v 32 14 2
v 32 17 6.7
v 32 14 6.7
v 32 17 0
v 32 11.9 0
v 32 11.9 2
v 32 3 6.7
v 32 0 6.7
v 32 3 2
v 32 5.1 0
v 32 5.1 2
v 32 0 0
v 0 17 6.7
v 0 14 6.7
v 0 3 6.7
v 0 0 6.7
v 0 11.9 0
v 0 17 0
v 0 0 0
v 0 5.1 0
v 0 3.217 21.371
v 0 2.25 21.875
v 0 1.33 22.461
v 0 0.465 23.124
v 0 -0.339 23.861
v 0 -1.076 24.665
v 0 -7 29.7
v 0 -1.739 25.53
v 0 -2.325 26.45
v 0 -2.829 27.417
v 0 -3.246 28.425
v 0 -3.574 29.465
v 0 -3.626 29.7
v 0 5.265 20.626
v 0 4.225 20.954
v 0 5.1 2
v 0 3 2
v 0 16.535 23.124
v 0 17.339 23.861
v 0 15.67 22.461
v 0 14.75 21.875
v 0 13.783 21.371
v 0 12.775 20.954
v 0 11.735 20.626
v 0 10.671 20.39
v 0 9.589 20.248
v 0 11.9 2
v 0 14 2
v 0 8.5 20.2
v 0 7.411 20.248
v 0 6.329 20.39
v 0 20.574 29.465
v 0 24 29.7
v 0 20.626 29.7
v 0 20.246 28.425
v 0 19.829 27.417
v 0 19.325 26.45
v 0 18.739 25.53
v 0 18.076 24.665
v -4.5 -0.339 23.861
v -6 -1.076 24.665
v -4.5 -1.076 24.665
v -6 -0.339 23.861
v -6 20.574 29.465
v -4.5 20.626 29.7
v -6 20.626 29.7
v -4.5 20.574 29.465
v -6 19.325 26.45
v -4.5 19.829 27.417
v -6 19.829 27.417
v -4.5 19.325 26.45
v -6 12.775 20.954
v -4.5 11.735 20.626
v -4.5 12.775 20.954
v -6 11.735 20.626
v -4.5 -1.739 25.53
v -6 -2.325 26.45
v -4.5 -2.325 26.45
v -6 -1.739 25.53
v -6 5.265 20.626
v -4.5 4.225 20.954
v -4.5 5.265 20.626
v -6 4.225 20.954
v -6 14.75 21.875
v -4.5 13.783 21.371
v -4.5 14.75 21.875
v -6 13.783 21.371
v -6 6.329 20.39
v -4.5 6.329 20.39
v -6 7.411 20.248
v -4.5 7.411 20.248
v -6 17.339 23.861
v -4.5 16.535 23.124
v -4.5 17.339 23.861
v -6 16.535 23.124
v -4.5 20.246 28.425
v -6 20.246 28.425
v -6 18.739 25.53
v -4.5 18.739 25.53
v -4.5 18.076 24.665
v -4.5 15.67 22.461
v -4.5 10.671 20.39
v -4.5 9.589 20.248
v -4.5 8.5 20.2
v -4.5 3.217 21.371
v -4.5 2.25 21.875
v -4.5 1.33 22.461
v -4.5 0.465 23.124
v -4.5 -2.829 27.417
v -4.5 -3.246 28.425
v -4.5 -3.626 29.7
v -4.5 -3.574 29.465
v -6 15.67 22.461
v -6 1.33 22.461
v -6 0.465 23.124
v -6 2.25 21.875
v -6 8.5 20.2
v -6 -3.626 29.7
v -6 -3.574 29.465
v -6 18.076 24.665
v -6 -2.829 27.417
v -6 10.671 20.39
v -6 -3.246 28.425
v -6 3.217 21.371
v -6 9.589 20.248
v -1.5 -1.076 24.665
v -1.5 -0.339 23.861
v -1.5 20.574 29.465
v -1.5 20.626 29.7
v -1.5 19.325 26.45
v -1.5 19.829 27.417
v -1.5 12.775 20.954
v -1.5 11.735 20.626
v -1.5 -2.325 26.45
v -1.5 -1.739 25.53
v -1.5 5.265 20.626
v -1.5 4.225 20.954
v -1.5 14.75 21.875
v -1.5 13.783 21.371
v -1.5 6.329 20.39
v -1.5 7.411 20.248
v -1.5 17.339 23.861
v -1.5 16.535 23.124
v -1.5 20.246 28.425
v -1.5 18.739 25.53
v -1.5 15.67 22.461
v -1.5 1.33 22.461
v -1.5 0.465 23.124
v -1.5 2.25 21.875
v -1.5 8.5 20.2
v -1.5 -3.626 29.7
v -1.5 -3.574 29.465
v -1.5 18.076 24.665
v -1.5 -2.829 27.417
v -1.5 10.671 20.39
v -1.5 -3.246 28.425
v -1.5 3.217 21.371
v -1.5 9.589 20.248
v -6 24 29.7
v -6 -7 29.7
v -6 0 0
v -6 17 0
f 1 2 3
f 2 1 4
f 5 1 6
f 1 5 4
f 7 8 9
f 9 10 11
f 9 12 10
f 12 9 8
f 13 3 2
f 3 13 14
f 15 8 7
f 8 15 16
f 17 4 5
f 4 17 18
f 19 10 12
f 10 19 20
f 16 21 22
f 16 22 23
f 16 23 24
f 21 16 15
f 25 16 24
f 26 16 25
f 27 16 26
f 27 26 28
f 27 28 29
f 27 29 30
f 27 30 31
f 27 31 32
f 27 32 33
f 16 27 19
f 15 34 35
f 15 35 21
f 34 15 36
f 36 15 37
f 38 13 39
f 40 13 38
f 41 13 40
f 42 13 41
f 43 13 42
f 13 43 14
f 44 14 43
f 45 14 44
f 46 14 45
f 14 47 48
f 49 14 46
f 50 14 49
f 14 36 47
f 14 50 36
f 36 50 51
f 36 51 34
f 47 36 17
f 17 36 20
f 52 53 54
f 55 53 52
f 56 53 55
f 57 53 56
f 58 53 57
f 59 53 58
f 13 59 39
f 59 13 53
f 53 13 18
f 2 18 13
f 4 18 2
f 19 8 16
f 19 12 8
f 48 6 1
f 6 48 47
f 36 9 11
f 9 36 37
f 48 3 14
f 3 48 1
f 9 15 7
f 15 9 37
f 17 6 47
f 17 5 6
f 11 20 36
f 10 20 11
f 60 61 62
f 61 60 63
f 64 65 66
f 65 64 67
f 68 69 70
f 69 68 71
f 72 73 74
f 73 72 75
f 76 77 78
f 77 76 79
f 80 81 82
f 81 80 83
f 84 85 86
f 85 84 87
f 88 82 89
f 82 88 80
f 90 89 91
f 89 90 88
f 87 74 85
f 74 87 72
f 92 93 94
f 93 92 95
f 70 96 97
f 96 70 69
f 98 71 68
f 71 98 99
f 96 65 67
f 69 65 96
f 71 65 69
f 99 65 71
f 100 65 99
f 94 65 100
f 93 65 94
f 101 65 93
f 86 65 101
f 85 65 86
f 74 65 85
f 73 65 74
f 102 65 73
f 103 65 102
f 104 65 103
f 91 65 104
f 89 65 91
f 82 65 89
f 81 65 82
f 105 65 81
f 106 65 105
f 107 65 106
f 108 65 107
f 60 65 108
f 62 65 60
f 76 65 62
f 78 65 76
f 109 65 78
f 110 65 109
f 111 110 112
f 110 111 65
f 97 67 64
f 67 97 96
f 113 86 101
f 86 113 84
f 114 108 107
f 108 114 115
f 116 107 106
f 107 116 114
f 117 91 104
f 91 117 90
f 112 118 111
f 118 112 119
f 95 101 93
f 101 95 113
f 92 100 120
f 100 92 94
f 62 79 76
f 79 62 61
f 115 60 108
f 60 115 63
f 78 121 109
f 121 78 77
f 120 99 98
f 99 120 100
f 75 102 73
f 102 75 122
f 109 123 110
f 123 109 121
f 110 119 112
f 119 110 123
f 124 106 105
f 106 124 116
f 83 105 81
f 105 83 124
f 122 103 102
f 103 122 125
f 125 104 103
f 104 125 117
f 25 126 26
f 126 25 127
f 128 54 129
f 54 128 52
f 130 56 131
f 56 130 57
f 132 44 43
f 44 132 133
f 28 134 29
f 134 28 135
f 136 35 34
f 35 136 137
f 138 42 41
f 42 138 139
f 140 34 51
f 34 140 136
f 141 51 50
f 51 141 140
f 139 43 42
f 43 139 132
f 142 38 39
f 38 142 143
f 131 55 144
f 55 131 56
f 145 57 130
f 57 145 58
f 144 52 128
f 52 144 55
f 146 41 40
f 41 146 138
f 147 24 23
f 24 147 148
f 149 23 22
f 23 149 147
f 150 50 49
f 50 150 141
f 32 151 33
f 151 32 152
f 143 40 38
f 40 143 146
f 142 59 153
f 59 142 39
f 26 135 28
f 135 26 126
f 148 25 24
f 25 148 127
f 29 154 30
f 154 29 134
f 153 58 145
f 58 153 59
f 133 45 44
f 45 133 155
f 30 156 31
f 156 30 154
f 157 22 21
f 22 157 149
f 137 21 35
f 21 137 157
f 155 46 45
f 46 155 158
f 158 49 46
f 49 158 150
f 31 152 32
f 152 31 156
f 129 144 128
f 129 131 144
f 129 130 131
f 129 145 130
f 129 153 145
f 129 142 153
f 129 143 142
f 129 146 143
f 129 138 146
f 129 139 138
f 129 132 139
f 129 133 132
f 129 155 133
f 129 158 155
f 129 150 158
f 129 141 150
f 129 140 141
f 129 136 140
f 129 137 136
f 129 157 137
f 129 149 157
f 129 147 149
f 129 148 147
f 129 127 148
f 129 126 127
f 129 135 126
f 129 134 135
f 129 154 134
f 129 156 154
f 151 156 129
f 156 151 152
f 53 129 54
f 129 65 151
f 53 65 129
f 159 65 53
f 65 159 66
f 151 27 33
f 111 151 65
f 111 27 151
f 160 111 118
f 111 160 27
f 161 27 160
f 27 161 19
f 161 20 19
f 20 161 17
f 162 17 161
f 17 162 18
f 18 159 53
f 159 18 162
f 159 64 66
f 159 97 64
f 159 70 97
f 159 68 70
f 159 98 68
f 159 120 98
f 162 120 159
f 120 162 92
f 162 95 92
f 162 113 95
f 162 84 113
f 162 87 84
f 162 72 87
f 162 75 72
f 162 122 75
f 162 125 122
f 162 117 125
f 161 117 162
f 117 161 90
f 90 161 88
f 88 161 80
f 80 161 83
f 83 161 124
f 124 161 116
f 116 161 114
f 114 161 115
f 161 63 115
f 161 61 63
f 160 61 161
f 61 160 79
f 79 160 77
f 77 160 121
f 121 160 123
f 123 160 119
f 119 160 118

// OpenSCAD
Gap = 0.2;
$fn = 72;

FrameToMotorSupport();

module FrameToMotorSupport() {
    Thickness = 3.0;

    MotorInnerRadius = 12.5;
    MotorBraceRadius = MotorInnerRadius + Thickness;

    SupportHeight = 6.0;
    MotorRadius = 26.0;

    HeadDiameter = 11.0;
    HeadHeight = 4.5 + Gap;

    ThreadDiameter = 6.6 + Gap; // I measured 6.2, but RodToBearingCoupling uses 6.5 for a snug fit
    ThreadHeight = 2.0;

    FrameAdapterWidth = HeadDiameter + 2*Thickness;
    FrameAdapterLength = 32;
    FrameAdapterHeight = ThreadHeight + HeadHeight;

    BearingAdapterOffset = MotorRadius + FrameAdapterHeight; // Center of the rod
    BearingAdapterShift = 0;

    GuideRodSnugRadius = 2.5;
    GuideRodOffset = MotorInnerRadius + Thickness/2 + GuideRodSnugRadius;

    MountingNutOffset = 19;
    MountingNutRadius = 2.0;

    ToTheSky = 50;

    union() {
        // Frame adapter
        difference() {
            cube([FrameAdapterLength, FrameAdapterWidth, FrameAdapterHeight]);

            // Volume of the nut head
            translate([0, Thickness, ThreadHeight])
                cube([FrameAdapterLength, HeadDiameter, HeadHeight]);

            // Volume of the nut thread
            translate([0, Thickness + (HeadDiameter - ThreadDiameter)/2, 0])
                cube([FrameAdapterLength, ThreadDiameter, ThreadHeight]);
        }

        // Motor adapter
        rotate([0, -90, 0])
        translate([BearingAdapterOffset, FrameAdapterWidth/2, -BearingAdapterShift +SupportHeight/2])
        difference() {
            union()
            {
                // Connection to frame adapter
                translate([-BearingAdapterOffset/2, 0, 0])
                linear_extrude(height = SupportHeight, center = true)
                    polygon(points = [
                    [-BearingAdapterOffset/2, -FrameAdapterWidth/2],
                    [BearingAdapterOffset/2 - Thickness, -MotorBraceRadius],
                    [BearingAdapterOffset/2 - Thickness, MotorBraceRadius],
                    [-BearingAdapterOffset/2, FrameAdapterWidth/2],
                    ]);
            }
            union() {
                // Volume of motor
                translate([0, 0, Thickness])
                    cylinder(r = MotorInnerRadius, h=Thickness, center=true);
                translate([0, 0, -Thickness])
                    cylinder(r = MotorInnerRadius, h=Thickness, center=true);
            }
        }
    }
}
